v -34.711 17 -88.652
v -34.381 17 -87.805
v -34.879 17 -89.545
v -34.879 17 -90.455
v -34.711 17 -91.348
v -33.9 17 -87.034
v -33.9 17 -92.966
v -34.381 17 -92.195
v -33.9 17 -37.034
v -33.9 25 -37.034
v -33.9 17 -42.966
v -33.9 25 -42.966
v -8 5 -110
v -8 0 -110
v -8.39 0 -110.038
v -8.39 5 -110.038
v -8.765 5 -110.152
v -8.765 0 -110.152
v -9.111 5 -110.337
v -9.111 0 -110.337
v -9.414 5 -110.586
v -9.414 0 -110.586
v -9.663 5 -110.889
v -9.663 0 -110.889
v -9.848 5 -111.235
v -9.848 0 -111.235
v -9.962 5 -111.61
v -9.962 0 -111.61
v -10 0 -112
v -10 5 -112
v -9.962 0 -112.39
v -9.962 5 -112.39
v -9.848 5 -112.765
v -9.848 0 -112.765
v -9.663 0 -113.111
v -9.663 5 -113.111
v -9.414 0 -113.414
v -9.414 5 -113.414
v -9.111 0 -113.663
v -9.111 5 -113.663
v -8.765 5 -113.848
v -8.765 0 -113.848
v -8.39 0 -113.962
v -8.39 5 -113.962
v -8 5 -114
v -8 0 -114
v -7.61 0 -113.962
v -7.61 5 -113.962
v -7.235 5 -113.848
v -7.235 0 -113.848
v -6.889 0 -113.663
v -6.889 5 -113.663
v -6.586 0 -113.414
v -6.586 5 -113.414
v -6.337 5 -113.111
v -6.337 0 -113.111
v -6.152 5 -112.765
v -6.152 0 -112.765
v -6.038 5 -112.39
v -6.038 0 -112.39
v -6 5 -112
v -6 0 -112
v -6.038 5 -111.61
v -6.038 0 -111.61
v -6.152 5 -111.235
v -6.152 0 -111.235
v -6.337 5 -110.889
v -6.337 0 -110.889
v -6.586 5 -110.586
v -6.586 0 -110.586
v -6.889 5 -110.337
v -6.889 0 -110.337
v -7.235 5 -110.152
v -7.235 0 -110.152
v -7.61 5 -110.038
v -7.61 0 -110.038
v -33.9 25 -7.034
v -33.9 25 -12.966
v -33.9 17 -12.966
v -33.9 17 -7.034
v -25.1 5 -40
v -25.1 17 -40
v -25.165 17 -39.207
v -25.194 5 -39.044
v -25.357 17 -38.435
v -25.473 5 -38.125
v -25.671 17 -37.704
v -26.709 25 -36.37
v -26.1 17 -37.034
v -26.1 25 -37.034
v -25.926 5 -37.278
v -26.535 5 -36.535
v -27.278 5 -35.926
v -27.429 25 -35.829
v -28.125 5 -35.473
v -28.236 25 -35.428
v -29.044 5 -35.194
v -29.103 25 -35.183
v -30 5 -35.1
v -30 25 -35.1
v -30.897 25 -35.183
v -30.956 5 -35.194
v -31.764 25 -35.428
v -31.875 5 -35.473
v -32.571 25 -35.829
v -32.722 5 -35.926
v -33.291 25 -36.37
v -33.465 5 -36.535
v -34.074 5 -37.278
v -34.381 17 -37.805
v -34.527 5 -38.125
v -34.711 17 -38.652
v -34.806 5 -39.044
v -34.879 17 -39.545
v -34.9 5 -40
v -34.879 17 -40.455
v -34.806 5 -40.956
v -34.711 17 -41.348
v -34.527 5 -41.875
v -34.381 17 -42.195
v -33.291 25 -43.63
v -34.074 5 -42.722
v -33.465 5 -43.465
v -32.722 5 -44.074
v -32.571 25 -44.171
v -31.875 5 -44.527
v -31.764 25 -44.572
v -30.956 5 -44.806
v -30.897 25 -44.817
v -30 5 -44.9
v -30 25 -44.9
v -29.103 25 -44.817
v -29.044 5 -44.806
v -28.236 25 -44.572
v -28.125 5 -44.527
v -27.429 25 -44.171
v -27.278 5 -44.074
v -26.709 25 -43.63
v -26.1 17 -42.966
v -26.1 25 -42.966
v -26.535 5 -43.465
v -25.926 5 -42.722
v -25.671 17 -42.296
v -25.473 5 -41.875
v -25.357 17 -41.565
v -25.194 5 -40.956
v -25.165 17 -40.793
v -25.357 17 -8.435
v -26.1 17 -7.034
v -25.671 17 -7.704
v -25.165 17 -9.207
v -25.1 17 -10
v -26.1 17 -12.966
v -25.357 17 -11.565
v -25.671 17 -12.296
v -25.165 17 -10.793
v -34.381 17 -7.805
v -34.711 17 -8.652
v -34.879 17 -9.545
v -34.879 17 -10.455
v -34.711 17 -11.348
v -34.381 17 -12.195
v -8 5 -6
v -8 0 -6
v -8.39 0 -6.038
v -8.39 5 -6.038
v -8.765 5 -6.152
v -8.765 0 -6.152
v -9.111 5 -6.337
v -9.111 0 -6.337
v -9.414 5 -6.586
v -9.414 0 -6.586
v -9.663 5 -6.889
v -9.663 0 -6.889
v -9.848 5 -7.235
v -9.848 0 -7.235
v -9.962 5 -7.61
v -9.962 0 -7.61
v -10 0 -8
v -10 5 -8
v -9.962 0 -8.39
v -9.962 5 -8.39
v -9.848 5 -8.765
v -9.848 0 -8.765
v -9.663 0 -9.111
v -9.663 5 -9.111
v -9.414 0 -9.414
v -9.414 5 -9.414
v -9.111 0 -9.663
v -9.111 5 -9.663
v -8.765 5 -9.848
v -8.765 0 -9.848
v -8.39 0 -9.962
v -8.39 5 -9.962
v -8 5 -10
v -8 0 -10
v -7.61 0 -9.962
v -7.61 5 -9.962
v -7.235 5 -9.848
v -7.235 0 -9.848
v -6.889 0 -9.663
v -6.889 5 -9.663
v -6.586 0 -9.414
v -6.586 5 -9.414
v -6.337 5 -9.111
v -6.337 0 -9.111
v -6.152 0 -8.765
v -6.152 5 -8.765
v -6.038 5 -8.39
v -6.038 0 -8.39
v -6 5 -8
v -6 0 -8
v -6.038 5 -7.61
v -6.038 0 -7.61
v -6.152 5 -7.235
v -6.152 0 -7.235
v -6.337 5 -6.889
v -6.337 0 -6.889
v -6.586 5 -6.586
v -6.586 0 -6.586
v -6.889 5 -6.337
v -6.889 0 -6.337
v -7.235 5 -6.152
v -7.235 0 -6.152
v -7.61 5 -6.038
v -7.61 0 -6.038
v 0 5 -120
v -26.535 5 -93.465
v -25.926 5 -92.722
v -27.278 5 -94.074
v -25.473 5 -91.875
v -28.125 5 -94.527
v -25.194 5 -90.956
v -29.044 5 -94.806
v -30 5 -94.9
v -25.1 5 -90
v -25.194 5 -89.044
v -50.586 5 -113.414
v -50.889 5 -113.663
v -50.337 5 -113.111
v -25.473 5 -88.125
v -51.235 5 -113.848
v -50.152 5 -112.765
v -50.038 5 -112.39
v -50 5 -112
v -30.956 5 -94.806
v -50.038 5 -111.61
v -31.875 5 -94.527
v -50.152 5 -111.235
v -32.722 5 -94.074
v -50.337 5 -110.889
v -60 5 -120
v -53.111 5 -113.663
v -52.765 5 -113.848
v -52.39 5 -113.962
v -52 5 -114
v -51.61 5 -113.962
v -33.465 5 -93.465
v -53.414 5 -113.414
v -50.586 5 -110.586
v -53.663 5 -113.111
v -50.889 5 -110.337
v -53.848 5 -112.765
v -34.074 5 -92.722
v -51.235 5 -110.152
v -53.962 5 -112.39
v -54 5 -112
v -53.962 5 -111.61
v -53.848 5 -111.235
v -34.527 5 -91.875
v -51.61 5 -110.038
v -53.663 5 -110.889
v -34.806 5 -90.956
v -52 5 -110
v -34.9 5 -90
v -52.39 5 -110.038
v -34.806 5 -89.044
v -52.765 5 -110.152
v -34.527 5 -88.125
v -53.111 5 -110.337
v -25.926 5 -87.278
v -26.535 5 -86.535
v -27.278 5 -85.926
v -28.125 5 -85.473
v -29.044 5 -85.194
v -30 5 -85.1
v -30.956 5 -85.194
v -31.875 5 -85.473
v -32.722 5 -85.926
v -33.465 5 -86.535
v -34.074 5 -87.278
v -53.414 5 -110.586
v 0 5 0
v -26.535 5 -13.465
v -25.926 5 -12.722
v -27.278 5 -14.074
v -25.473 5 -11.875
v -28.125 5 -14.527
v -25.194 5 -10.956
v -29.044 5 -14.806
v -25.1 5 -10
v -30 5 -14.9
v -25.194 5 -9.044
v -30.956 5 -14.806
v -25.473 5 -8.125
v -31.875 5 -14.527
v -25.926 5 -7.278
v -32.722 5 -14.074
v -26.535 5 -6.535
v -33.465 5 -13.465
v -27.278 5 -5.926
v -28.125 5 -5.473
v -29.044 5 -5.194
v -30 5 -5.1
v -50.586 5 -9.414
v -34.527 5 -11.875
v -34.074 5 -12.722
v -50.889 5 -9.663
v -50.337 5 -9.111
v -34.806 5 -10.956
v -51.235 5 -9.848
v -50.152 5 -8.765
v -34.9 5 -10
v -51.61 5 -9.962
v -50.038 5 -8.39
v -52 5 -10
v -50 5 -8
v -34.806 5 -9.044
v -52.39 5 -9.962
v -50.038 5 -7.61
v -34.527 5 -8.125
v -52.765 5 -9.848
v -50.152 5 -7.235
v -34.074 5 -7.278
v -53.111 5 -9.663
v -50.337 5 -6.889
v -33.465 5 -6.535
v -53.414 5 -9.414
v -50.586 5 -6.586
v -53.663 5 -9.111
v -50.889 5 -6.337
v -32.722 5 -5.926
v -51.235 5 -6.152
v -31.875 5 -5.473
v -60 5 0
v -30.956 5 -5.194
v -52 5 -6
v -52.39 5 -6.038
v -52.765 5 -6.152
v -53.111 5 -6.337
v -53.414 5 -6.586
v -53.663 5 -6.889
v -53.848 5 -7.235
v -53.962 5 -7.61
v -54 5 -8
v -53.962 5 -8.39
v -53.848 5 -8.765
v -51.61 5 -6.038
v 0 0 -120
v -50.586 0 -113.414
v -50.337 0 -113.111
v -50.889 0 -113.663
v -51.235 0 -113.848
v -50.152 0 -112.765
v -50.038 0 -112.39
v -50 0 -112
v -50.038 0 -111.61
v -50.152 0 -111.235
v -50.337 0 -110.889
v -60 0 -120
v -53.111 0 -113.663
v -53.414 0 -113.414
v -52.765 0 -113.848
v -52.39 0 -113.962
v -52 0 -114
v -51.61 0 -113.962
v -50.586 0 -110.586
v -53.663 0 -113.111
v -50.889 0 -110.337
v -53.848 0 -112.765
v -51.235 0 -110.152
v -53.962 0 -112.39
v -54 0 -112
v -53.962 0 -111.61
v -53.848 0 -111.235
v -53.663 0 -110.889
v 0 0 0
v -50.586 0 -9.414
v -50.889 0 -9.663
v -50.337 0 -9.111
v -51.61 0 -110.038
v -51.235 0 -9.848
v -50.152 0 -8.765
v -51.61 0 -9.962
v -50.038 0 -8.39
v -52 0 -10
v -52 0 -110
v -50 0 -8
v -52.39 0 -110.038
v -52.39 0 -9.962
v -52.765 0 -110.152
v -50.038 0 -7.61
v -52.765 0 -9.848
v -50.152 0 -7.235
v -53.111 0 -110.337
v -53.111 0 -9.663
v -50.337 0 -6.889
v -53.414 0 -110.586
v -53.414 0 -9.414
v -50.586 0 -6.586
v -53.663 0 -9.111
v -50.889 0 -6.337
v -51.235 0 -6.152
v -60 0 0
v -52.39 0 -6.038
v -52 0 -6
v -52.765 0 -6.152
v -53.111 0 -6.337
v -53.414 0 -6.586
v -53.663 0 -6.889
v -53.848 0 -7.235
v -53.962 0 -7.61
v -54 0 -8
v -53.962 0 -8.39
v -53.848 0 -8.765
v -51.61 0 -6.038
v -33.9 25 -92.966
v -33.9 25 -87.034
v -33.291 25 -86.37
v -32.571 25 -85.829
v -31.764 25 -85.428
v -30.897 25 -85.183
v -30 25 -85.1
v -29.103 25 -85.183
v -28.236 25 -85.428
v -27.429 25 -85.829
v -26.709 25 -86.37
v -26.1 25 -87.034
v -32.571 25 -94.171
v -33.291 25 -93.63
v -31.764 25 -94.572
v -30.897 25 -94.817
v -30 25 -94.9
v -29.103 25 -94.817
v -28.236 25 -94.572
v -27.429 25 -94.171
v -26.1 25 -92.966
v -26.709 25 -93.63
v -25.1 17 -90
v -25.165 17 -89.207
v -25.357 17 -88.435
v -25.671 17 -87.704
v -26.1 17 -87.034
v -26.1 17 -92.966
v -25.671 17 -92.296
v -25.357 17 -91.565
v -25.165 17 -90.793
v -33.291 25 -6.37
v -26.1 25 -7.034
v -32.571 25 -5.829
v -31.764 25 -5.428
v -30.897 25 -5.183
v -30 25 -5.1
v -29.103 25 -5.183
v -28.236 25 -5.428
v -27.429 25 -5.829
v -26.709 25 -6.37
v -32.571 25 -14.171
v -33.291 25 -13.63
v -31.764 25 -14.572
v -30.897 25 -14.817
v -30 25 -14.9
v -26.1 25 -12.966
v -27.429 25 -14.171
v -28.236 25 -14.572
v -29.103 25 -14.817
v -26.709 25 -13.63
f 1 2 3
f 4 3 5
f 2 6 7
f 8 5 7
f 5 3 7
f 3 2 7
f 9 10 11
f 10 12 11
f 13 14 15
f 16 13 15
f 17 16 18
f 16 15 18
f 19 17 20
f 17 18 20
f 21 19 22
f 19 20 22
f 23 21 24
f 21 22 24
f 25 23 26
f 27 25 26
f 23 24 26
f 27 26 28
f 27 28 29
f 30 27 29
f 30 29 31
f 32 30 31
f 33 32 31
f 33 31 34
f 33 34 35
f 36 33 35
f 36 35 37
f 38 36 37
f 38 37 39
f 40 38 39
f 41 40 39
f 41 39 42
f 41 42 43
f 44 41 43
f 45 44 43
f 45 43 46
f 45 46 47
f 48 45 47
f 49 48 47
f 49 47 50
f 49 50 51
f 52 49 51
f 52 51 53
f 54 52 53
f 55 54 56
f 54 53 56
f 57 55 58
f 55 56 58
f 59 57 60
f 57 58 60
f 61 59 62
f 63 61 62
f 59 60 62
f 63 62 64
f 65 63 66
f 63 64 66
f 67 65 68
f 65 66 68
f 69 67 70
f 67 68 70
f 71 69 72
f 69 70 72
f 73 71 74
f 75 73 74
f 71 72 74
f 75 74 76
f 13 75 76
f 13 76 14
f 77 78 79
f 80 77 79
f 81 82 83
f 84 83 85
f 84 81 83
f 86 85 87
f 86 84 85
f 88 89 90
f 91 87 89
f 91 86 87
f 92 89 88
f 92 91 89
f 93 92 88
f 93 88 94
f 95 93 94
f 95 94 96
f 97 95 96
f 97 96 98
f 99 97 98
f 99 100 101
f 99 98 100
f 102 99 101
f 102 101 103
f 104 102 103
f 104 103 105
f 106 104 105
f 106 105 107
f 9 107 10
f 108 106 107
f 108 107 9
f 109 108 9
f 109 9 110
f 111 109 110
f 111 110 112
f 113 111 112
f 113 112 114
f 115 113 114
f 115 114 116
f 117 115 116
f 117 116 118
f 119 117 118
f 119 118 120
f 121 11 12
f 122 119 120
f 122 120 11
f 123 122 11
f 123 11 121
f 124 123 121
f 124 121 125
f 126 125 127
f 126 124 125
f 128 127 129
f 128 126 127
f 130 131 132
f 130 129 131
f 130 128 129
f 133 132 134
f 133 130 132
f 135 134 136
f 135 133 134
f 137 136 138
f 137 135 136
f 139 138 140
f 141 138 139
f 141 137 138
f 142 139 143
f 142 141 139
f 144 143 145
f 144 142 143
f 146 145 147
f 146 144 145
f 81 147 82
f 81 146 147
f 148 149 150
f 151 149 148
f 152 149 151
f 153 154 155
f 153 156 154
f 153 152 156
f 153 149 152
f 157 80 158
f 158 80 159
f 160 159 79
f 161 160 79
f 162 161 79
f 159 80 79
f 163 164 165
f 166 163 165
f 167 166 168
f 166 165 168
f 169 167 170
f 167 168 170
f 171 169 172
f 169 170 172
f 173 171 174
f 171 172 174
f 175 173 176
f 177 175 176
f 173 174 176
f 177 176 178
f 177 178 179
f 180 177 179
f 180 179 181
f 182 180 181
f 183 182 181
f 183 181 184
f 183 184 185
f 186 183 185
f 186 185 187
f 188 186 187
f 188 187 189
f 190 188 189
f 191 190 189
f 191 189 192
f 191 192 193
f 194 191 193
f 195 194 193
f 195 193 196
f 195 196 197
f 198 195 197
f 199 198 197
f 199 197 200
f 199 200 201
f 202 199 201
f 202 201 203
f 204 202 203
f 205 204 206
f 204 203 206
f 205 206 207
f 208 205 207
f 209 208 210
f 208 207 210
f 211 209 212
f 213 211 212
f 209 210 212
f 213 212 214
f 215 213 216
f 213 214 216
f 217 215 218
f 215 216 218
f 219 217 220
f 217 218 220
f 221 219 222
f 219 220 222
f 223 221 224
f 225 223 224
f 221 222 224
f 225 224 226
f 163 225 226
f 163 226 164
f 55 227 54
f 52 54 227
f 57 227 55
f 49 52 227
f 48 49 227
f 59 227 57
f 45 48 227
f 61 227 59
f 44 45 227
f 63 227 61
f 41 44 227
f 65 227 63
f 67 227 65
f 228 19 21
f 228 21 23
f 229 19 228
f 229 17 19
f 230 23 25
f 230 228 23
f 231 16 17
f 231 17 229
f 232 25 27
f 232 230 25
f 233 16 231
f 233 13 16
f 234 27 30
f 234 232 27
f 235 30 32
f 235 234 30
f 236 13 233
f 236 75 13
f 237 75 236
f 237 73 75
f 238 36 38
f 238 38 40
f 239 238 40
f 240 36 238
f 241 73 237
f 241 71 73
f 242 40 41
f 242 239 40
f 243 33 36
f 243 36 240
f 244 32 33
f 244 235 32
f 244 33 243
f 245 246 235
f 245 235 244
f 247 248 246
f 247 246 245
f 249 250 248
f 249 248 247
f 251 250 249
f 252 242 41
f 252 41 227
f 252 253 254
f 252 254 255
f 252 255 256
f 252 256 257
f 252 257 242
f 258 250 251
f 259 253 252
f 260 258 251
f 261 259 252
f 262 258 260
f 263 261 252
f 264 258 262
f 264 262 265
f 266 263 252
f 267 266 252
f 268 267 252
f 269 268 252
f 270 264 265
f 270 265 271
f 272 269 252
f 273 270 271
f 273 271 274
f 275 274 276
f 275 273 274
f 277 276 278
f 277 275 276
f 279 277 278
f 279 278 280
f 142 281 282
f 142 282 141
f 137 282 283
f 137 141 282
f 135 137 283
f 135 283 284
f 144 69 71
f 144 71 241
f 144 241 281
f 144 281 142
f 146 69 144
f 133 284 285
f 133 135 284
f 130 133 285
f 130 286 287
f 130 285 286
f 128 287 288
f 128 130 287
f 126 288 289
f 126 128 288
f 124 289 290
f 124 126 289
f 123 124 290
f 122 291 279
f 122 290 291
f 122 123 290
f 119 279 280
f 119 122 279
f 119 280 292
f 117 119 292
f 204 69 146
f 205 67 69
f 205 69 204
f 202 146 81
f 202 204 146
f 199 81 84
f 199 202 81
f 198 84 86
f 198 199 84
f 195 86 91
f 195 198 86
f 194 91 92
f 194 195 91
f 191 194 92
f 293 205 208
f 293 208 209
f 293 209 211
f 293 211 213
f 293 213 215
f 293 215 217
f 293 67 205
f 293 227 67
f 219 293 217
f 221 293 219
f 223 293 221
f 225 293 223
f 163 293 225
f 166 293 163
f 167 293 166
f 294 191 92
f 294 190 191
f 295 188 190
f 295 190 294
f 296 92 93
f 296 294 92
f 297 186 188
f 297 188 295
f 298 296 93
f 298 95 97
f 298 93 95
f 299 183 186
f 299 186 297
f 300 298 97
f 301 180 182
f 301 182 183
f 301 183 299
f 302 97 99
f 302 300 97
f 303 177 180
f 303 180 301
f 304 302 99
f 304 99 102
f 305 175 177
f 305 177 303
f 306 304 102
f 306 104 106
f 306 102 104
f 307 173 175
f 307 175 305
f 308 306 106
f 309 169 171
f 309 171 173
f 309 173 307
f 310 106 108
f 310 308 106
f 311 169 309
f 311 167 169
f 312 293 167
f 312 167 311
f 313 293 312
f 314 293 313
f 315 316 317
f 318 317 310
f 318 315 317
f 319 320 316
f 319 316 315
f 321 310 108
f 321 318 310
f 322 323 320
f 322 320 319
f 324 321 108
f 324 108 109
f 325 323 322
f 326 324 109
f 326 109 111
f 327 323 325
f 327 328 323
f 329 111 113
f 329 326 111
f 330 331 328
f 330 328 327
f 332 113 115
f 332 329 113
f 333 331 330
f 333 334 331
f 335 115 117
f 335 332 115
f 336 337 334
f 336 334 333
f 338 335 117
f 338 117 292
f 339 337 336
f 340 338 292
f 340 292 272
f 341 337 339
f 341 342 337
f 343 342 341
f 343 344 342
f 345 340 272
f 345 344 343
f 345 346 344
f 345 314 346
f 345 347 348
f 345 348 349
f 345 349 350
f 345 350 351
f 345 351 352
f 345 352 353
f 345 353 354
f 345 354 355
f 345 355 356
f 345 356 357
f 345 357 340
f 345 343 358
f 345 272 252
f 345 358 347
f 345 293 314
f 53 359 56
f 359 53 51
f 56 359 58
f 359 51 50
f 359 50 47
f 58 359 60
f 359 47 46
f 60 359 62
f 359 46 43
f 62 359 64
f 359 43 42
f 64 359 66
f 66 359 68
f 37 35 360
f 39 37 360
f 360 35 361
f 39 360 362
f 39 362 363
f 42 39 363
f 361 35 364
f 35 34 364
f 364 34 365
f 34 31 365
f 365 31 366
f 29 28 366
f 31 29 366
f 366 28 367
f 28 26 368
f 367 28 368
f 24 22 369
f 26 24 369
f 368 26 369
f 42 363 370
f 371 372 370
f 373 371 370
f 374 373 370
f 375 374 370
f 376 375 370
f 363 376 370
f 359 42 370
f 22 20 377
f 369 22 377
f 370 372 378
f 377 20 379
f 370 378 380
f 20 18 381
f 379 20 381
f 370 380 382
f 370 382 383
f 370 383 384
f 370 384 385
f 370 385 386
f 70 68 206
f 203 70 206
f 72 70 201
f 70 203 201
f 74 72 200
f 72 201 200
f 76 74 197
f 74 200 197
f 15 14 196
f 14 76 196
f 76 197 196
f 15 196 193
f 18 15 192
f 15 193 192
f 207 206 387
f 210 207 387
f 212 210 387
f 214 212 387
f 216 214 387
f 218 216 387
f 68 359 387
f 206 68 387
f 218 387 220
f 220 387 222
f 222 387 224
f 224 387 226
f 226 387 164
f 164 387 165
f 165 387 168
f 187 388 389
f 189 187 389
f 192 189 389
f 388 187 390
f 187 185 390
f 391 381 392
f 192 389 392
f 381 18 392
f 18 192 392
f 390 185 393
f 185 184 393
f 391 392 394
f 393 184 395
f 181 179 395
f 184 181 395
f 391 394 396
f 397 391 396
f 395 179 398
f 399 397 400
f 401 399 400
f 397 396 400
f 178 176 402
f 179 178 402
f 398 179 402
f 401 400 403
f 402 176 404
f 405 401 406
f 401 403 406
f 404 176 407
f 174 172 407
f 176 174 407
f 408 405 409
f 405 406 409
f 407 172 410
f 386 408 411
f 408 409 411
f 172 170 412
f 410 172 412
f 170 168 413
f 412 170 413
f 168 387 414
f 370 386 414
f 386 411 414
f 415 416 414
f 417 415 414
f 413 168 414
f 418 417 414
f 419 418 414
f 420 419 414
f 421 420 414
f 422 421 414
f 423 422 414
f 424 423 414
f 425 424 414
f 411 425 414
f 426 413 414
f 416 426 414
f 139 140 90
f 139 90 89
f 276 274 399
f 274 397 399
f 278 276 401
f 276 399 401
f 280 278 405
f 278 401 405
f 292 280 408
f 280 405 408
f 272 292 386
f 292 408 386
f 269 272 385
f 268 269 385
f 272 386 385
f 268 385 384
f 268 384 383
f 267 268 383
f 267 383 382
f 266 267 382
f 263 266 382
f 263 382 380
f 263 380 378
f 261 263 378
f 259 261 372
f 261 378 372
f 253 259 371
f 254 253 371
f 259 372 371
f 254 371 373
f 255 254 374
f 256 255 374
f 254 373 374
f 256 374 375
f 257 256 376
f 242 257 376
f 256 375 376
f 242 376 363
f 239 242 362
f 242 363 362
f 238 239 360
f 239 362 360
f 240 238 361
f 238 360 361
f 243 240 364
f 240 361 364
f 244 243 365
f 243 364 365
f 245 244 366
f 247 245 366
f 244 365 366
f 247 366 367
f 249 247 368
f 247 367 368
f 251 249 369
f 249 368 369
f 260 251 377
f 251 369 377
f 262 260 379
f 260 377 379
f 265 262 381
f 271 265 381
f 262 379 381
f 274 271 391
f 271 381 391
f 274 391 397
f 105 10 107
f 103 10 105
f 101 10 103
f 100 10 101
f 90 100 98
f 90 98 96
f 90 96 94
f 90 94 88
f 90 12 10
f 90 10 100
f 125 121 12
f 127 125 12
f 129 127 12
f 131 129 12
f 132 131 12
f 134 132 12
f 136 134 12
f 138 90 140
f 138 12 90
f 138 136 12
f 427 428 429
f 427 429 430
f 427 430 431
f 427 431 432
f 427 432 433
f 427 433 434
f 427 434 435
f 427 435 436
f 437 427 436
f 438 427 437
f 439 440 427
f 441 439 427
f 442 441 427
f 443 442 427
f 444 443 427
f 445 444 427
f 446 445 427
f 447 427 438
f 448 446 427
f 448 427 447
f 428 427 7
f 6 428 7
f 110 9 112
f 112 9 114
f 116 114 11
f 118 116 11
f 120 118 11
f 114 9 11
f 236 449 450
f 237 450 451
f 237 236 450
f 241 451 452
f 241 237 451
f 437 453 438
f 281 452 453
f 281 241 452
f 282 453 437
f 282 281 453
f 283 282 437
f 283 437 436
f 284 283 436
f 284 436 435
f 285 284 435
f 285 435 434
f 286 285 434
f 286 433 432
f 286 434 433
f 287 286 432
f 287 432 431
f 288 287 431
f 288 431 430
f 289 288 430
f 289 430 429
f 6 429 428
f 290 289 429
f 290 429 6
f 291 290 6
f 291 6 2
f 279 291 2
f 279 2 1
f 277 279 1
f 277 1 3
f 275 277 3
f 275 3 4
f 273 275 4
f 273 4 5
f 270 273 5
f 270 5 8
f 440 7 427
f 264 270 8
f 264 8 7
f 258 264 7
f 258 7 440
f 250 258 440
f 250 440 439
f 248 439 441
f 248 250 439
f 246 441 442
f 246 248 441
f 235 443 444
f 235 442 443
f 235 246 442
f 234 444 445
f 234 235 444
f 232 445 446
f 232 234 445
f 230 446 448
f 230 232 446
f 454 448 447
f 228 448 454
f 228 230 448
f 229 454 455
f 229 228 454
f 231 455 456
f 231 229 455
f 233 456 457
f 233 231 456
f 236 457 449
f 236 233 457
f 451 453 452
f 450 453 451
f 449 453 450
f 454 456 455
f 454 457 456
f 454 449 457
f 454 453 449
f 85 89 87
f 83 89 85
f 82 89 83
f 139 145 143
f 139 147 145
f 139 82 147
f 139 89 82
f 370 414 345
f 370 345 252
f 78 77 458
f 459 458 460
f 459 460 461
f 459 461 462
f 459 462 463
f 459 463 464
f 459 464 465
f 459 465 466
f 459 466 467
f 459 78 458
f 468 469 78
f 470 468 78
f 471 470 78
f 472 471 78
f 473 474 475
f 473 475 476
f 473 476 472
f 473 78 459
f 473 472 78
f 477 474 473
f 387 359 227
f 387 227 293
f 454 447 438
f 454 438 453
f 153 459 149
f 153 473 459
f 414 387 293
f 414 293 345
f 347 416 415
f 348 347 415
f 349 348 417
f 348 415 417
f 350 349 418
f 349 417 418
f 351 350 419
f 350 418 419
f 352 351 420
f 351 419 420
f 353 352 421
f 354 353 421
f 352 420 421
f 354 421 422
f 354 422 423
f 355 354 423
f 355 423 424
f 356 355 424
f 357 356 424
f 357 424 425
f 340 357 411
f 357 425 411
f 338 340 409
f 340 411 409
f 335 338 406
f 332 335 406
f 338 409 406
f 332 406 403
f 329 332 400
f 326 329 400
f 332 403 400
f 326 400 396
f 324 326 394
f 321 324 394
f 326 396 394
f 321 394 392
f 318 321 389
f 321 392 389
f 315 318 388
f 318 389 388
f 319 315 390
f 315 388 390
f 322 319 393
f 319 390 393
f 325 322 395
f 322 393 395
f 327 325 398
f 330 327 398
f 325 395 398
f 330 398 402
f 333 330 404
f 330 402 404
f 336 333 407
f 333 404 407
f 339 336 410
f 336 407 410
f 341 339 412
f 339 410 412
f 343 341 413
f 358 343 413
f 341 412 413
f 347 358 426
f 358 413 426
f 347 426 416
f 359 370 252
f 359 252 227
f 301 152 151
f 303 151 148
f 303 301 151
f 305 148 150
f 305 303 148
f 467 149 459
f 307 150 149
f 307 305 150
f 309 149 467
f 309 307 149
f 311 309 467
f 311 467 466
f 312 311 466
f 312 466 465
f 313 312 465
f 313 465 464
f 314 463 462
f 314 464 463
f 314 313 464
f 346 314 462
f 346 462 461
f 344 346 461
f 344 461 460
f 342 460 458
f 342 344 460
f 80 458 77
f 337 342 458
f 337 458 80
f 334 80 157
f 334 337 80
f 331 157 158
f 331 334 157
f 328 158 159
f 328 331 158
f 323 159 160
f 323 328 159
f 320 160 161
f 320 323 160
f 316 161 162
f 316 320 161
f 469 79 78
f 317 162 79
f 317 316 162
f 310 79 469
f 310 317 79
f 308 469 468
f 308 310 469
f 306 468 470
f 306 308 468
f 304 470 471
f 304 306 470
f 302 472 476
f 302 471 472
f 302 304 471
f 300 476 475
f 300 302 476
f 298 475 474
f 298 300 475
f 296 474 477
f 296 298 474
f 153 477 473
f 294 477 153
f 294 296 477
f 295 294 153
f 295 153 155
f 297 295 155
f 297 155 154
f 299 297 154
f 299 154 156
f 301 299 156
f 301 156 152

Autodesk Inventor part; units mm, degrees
ref_plane "YZ Plane" through (0, 0, 0) normal (1, 0, 0) x (0, 1, 0)
ref_plane "XZ Plane" through (0, 0, 0) normal (0, 1, 0) x (-1, 0, 0)
ref_plane "XY Plane" through (0, 0, 0) normal (0, 0, 1) x (1, 0, 0)
sketch "Skizze1" plane through (0, 0, 0) normal (0, 1, 0) x (-1, 0, 0)
  line L0 (0, 0) -> (60, 0)
  line L1 (60, 0) -> (60, -120)
  line L2 (60, -120) -> (0, -120)
  line L3 (0, -120) -> (0, 0)
  dimension "d0" = 120
  dimension "d1" = 60
extrude "Extrusion1" add sketch "Skizze1" along normal blind 5
sketch "Skizze2" plane through (0, 5, 0) normal (0, 1, 0) x (1, 0, 0)
  circle A0 centre (-30, 10) radius 4.9
  circle A1 centre (-30, 40) radius 4.9
  circle A2 centre (-30, 90) radius 4.9
  line L0 (-60, 0) -> (0, 0) projected
  line L1 (0, 0) -> (0, 120) projected
  dimension "d4" = 10
  dimension "d5" = 30
  dimension "d6" = 50
  dimension "d7" = 30
  dimension "d8" = 30
  dimension "d9" = 30
  dimension "d10" = 9.8
  dimension "d11" = 9.8
  dimension "d12" = 9.8
extrude "Extrusion2" add sketch "Skizze2" along normal blind 20
sketch "Skizze3" plane through (0, 0, -120) normal (0, 0, -1) x (-1, 0, 0)
  line L0 (25.1, 5) -> (25.1, 25) projected
  line L1 (25.1, 6.7142) -> (25.1, 25)
  line L2 (34.9, 5) -> (34.9, 25) projected
  line L3 (34.9, 5) -> (34.9, 25)
  line L4 (60, 5) -> (0, 5) projected
  line L5 (23.3172, 25) -> (26.1, 25)
  line L6 (26.1, 25) -> (26.1, 17)
  line L7 (26.1, 17) -> (23.3172, 17)
  line L8 (23.3172, 17) -> (23.3172, 25)
  line L9 (36.4895, 25) -> (33.9, 25)
  line L10 (33.9, 25) -> (33.9, 17)
  line L11 (33.9, 17) -> (36.4895, 17)
  line L12 (36.4895, 17) -> (36.4895, 25)
  line L13 (34.9, 25) -> (25.1, 25) projected
  point P0 (0, 0)
  dimension "d19" = 8
  dimension "d20" = 1
  dimension "d21" = 1
extrude "Extrusion3" cut sketch "Skizze3" against normal blind 120 contours L7 L8 L5 L0 | L0 L5 L6 L7 | L11 L10 L9 L2 | L2 L9 L12 L11
sketch "Skizze4" plane through (0, 5, 0) normal (0, 1, 0) x (1, 0, 0)
  line L0 (0, 0) -> (0, 120) projected
  line L1 (-60, 0) -> (0, 0) projected
  line L2 (-60, 120) -> (-60, 0) projected
  line L3 (0, 120) -> (-60, 120) projected
  point P0 (-8, 8)
  point P1 (-52, 8)
  point P2 (-8, 112)
  point P3 (-52, 112)
  dimension "d31" = 8
  dimension "d32" = 8
  dimension "d33" = 8
  dimension "d34" = 8
  dimension "d35" = 8
  dimension "d36" = 8
  dimension "d37" = 8
  dimension "d38" = 8
  dimension "d39" = 104
  dimension "d40" = 44
hole "Bohrung1" at (-8, 5, -8) at (-52, 5, -8) at (-8, 5, -112) at (-52, 5, -112) direction (0, -1, 0) diameter 4 depth 5
properties part number "Gear_Platte_3D-Druck_3D-Druck"
